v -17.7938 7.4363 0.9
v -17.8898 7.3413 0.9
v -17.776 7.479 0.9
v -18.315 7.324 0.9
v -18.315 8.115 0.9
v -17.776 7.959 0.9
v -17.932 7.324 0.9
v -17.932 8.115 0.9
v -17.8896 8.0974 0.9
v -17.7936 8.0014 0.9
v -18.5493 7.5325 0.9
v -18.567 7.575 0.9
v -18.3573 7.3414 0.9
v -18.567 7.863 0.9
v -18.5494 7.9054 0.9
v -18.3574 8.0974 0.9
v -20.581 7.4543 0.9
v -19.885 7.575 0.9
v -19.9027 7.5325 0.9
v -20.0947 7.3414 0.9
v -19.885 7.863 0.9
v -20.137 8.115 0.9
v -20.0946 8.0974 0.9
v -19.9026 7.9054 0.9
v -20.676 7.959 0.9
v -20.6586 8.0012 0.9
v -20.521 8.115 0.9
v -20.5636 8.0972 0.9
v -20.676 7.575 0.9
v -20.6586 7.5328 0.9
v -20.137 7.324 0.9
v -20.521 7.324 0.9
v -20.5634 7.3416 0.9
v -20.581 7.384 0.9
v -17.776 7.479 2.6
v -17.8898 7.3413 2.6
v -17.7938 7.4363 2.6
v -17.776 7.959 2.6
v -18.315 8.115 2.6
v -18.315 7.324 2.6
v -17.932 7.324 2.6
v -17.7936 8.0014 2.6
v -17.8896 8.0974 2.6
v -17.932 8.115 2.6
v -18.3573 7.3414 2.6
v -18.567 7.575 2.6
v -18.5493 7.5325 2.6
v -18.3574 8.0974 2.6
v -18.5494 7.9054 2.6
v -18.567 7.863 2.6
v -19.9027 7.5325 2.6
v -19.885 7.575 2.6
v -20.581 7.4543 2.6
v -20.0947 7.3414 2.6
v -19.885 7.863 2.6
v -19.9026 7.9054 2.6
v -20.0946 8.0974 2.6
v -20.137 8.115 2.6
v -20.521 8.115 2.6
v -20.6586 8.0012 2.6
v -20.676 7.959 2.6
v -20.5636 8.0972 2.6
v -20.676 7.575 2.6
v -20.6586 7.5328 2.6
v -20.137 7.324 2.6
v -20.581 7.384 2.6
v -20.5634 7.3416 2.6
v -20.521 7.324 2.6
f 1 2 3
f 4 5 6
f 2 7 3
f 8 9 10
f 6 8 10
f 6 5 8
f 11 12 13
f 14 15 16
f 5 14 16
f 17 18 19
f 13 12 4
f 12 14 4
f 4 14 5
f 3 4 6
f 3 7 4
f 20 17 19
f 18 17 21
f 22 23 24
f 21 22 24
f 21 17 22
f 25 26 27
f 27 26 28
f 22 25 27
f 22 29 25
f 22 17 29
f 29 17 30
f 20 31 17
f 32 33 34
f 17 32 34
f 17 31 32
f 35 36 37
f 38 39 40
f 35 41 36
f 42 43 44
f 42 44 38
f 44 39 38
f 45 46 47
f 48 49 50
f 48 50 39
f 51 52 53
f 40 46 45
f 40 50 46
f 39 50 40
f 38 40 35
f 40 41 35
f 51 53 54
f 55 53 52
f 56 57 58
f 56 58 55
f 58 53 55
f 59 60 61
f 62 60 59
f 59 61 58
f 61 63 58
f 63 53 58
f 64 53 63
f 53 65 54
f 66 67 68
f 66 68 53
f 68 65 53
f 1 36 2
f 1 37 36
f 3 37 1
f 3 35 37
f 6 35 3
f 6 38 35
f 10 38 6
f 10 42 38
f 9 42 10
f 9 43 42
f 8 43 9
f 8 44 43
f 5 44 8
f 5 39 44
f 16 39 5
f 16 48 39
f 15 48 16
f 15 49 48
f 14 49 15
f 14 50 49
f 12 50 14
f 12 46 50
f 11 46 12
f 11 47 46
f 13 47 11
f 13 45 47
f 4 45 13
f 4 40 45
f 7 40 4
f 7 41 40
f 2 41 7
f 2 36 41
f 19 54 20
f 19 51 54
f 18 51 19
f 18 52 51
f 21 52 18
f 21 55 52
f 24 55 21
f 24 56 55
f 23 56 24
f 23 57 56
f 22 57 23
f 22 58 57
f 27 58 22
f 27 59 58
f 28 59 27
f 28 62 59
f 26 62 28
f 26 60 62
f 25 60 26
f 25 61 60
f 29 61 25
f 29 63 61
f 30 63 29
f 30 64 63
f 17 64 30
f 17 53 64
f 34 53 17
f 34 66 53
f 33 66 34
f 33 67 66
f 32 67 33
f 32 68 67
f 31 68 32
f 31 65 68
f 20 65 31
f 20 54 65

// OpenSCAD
$fn = 24;
translate([0, 0.000, 0.900])
  linear_extrude(height=1.700) {
offset(r=0.06, $fn=8) {
    polygon(points=[[-18.315,8.055],[-18.507,7.863],[-18.507,7.575],[-18.315,7.384],[-17.932,7.384],[-17.836,7.479],[-17.836,7.959],[-17.932,8.055]], paths=[[0,1,2,3,4,5,6,7]]);
    polygon(points=[[-20.521,8.055],[-20.616,7.959],[-20.616,7.575],[-20.521,7.479],[-20.521,7.384],[-20.137,7.384],[-19.945,7.575],[-19.945,7.863],[-20.137,8.055]], paths=[[0,1,2,3,4,5,6,7,8]]);
}
}
